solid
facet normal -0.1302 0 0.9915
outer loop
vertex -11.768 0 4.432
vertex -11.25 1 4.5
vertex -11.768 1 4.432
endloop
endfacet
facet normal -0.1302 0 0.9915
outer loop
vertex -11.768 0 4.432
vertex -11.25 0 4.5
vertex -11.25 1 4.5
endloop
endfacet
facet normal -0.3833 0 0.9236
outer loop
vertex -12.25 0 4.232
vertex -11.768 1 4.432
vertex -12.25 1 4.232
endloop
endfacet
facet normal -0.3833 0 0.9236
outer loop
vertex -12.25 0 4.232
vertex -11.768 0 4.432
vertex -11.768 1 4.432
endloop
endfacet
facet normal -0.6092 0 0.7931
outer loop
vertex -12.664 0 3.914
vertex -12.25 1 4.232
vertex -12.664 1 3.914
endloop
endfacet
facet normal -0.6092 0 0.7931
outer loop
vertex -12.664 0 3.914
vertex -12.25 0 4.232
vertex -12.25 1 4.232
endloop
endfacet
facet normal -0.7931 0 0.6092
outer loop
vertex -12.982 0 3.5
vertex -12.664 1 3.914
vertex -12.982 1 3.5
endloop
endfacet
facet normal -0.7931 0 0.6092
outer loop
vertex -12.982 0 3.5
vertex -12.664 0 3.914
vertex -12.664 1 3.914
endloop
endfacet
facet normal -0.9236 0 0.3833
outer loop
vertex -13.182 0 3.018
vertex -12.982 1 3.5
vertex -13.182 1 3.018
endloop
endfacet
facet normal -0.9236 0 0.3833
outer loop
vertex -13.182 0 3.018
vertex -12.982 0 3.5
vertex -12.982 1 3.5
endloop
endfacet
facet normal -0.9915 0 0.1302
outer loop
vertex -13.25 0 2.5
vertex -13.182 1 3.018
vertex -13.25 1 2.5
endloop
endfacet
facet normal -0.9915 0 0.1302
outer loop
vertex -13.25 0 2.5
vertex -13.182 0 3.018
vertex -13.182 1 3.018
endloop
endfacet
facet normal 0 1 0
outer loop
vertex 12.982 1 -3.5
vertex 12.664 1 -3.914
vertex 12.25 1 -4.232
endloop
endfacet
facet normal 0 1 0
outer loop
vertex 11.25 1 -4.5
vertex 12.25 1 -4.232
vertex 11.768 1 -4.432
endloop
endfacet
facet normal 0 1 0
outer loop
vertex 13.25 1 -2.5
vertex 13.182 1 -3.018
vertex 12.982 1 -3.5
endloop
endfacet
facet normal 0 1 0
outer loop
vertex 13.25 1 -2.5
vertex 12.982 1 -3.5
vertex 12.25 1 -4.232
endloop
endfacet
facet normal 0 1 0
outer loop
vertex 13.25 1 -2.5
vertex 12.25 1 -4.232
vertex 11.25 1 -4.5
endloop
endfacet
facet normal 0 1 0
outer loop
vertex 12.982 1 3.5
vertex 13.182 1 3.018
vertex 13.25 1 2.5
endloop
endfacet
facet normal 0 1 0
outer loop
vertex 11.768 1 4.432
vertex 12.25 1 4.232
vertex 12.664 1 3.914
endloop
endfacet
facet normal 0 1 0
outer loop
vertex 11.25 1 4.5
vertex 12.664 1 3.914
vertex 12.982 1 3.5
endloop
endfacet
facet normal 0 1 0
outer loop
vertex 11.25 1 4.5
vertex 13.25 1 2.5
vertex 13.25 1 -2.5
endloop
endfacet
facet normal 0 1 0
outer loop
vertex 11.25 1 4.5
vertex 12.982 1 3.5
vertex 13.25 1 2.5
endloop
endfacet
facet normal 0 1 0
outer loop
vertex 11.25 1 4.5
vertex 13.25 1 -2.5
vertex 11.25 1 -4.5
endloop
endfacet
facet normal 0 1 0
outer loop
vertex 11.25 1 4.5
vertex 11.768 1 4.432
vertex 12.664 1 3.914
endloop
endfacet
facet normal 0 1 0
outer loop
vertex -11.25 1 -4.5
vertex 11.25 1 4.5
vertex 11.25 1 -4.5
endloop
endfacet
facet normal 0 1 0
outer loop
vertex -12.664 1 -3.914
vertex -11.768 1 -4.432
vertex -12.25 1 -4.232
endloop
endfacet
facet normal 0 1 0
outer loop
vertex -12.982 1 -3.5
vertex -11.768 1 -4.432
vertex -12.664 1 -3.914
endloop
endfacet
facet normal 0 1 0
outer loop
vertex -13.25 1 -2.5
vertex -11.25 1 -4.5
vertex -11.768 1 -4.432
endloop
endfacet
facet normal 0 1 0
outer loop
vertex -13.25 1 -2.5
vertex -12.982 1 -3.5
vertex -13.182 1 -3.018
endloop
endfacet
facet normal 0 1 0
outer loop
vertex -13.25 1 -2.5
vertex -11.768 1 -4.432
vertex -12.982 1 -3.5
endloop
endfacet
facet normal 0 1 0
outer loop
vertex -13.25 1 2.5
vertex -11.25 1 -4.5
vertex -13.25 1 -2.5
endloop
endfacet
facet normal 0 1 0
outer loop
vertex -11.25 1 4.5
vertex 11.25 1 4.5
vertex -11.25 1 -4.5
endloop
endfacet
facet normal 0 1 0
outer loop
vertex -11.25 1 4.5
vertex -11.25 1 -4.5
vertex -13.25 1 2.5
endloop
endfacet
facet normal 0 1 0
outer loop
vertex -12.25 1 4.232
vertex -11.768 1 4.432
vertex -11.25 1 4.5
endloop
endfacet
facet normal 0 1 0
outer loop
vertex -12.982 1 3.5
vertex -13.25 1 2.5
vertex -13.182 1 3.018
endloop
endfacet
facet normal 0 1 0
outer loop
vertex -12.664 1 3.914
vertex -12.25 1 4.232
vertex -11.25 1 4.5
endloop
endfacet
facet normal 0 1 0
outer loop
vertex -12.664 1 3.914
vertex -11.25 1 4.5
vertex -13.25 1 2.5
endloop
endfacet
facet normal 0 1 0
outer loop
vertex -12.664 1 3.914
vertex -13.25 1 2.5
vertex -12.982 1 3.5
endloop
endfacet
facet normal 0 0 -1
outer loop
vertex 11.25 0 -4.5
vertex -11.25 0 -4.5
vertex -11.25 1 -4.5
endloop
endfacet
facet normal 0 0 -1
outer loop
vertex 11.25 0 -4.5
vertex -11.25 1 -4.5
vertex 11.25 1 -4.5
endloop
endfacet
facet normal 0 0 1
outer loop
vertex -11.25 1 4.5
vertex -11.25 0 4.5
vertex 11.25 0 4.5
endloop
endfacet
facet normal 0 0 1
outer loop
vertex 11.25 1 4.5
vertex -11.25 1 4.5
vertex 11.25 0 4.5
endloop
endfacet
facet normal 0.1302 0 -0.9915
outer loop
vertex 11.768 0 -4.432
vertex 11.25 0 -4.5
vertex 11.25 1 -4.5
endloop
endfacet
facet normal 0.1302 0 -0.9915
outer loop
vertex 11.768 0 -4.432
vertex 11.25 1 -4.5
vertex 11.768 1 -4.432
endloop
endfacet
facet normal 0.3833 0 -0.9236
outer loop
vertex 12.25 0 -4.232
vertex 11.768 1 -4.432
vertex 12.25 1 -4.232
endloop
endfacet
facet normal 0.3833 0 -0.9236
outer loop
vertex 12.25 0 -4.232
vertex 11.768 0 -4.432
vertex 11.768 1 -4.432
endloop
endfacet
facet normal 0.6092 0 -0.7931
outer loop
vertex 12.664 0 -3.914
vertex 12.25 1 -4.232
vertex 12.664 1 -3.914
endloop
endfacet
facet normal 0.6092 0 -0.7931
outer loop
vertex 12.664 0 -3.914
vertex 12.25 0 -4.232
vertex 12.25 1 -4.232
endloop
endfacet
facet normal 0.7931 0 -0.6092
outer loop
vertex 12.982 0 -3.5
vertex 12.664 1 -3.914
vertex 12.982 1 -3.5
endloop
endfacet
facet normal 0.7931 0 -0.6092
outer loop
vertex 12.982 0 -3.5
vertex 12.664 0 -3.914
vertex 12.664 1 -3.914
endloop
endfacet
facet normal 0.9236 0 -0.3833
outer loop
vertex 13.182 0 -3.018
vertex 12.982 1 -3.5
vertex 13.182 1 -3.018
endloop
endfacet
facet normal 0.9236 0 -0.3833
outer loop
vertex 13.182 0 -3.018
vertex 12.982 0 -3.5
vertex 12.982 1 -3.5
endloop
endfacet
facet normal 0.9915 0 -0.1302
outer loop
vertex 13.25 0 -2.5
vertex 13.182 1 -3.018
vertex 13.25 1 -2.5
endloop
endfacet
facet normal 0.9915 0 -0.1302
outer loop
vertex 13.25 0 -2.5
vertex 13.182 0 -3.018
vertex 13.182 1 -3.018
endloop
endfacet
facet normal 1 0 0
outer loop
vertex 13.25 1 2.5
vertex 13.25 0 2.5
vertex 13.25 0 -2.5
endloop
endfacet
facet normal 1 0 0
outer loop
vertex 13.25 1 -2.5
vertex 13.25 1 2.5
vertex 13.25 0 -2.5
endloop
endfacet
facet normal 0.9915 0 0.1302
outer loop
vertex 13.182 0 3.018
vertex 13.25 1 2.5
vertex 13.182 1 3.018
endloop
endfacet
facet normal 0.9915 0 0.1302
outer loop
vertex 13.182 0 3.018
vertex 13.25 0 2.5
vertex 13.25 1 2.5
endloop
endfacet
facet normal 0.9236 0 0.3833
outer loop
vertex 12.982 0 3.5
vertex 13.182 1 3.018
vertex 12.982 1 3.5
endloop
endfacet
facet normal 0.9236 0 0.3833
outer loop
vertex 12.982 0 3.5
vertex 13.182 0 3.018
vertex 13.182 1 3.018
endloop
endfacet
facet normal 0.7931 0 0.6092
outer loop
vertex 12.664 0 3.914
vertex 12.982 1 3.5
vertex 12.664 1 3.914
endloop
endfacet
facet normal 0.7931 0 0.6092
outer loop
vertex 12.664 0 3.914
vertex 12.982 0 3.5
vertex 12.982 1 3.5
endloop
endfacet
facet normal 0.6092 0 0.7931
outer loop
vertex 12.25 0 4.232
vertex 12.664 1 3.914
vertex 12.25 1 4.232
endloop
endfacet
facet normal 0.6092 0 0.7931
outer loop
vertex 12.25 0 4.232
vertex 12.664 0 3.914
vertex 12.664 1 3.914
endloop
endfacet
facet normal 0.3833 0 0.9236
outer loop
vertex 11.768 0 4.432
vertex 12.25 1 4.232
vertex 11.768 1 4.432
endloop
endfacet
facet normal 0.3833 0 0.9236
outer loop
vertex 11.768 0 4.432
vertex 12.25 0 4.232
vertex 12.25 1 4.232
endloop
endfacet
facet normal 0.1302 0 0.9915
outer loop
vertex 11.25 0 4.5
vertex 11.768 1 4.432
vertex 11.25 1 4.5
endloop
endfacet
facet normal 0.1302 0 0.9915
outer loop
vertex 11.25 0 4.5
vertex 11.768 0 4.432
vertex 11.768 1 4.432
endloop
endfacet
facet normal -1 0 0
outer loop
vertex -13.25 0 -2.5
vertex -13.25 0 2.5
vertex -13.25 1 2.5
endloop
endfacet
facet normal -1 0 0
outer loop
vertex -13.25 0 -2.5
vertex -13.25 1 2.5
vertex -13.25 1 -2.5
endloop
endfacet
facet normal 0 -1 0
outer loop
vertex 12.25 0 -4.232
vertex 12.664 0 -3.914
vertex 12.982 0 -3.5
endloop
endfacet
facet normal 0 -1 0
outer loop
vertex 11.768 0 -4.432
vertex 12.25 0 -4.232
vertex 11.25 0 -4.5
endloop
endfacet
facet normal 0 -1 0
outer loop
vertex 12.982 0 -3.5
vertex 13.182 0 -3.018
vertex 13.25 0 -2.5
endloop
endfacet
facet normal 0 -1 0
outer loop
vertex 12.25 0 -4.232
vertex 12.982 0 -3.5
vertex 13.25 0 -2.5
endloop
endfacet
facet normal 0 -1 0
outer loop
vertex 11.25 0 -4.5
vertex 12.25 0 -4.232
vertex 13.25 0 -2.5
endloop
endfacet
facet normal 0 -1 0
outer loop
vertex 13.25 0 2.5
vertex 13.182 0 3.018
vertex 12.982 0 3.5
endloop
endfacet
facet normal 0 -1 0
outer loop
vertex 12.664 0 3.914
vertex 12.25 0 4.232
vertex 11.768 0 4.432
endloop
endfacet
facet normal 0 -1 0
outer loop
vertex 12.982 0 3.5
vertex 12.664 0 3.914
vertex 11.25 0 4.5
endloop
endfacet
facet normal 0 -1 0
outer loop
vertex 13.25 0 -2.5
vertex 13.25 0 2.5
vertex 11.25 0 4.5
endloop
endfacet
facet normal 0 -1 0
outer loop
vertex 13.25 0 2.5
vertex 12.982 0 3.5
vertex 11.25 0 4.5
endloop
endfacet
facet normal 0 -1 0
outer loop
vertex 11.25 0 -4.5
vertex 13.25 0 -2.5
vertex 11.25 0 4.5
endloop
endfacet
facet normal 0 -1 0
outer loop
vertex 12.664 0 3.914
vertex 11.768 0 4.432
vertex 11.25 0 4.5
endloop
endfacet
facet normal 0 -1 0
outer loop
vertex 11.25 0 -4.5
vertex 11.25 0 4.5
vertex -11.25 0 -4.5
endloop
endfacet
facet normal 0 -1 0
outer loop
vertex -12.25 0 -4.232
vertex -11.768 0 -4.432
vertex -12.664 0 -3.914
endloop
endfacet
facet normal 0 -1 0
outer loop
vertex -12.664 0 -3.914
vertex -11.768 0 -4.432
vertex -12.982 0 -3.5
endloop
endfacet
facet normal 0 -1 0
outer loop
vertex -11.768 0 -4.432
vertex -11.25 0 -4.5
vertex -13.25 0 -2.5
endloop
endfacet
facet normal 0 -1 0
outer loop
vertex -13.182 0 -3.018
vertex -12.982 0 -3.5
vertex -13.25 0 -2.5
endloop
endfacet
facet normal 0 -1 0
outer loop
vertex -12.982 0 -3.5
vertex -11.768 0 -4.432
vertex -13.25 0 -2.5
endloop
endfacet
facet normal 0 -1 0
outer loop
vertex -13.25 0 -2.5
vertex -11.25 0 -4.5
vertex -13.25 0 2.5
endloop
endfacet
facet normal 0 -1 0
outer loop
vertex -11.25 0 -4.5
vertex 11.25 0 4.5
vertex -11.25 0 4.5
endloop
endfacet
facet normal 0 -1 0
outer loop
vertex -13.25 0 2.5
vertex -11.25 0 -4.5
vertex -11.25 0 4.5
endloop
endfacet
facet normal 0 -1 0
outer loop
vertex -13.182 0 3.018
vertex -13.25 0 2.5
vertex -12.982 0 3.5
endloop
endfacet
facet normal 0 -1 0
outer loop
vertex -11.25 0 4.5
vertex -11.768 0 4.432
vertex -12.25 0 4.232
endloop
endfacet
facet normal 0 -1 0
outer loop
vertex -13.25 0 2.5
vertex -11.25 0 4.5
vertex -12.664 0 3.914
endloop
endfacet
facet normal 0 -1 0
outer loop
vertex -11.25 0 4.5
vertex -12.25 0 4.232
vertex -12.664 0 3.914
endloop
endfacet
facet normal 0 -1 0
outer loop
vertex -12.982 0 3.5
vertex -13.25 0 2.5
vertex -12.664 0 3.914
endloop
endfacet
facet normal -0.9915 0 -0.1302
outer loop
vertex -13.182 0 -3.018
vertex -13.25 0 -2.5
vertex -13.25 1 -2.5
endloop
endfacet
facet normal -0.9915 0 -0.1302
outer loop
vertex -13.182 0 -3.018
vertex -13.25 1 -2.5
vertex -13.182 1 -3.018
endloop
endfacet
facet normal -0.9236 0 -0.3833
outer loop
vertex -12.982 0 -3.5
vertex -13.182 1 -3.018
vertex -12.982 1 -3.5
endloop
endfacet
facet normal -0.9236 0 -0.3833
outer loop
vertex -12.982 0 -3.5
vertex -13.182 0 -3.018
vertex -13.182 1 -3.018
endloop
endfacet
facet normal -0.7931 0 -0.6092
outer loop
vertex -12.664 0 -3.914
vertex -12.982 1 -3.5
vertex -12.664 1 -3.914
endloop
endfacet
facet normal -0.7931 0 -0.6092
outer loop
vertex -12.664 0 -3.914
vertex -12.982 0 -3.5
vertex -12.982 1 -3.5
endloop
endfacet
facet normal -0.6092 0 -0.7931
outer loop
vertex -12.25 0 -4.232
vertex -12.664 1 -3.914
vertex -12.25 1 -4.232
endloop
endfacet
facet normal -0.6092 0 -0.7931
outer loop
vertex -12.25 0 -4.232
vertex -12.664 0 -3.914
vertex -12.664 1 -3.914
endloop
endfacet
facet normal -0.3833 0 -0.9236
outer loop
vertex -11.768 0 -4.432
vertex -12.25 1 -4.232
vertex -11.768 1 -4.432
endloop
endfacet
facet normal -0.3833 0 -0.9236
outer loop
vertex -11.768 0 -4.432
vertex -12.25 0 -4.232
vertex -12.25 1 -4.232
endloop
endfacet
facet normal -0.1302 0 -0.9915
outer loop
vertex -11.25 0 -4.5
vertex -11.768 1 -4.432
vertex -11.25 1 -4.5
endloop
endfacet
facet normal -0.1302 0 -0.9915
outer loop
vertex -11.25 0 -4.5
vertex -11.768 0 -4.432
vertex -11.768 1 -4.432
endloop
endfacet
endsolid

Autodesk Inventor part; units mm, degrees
ref_plane "YZ Plane" through (0, 0, 0) normal (1, 0, 0) x (0, 1, 0)
ref_plane "XZ Plane" through (0, 0, 0) normal (0, 1, 0) x (-1, 0, 0)
ref_plane "XY Plane" through (0, 0, 0) normal (0, 0, 1) x (1, 0, 0)
sketch "Szkic2" plane through (0, 0, 0) normal (0, 1, 0) x (-1, 0, 0)
  line L0 (6, 4.5) -> (-6, 4.5)
  line L1 (-6, 4.5) -> (-6, -4.5)
  line L2 (-6, -4.5) -> (6, -4.5)
  line L3 (6, -4.5) -> (6, 4.5)
  line L4 (9.7936, 0) -> (-12.3472, 0)
  line L5 (0, 10.0787) -> (0, -13.253)
  line L6 (6, 4.5) -> (11.25, 4.5)
  line L7 (13.25, 2.5) -> (13.25, -2.5)
  line L8 (11.25, -4.5) -> (6, -4.5)
  line L9 (6, -4.5) -> (6, 4.5)
  arc A0 (13.25, 2.5) -> (11.25, 4.5) centre (11.25, 2.5) ccw
  arc A1 (11.25, -4.5) -> (13.25, -2.5) centre (11.25, -2.5) ccw
  line L10 (-6, 4.5) -> (-11.25, 4.5)
  line L11 (-13.25, 2.5) -> (-13.25, -2.5)
  line L12 (-11.25, -4.5) -> (-6, -4.5)
  arc A2 (-11.25, 4.5) -> (-13.25, 2.5) centre (-11.25, 2.5) ccw
  arc A3 (-13.25, -2.5) -> (-11.25, -4.5) centre (-11.25, -2.5) ccw
  point P0 (0, 0)
  point P1 (13.25, 4.5)
  dimension "d7" = 12
  dimension "d8" = 9
  dimension "d9" = 4.5
  dimension "d10" = 6
  dimension "d11" = 7.25
  dimension "d12" = 2
extrude "Wyciągnięcie proste2" add sketch "Szkic2" along normal blind 1
properties part number "prent1"
